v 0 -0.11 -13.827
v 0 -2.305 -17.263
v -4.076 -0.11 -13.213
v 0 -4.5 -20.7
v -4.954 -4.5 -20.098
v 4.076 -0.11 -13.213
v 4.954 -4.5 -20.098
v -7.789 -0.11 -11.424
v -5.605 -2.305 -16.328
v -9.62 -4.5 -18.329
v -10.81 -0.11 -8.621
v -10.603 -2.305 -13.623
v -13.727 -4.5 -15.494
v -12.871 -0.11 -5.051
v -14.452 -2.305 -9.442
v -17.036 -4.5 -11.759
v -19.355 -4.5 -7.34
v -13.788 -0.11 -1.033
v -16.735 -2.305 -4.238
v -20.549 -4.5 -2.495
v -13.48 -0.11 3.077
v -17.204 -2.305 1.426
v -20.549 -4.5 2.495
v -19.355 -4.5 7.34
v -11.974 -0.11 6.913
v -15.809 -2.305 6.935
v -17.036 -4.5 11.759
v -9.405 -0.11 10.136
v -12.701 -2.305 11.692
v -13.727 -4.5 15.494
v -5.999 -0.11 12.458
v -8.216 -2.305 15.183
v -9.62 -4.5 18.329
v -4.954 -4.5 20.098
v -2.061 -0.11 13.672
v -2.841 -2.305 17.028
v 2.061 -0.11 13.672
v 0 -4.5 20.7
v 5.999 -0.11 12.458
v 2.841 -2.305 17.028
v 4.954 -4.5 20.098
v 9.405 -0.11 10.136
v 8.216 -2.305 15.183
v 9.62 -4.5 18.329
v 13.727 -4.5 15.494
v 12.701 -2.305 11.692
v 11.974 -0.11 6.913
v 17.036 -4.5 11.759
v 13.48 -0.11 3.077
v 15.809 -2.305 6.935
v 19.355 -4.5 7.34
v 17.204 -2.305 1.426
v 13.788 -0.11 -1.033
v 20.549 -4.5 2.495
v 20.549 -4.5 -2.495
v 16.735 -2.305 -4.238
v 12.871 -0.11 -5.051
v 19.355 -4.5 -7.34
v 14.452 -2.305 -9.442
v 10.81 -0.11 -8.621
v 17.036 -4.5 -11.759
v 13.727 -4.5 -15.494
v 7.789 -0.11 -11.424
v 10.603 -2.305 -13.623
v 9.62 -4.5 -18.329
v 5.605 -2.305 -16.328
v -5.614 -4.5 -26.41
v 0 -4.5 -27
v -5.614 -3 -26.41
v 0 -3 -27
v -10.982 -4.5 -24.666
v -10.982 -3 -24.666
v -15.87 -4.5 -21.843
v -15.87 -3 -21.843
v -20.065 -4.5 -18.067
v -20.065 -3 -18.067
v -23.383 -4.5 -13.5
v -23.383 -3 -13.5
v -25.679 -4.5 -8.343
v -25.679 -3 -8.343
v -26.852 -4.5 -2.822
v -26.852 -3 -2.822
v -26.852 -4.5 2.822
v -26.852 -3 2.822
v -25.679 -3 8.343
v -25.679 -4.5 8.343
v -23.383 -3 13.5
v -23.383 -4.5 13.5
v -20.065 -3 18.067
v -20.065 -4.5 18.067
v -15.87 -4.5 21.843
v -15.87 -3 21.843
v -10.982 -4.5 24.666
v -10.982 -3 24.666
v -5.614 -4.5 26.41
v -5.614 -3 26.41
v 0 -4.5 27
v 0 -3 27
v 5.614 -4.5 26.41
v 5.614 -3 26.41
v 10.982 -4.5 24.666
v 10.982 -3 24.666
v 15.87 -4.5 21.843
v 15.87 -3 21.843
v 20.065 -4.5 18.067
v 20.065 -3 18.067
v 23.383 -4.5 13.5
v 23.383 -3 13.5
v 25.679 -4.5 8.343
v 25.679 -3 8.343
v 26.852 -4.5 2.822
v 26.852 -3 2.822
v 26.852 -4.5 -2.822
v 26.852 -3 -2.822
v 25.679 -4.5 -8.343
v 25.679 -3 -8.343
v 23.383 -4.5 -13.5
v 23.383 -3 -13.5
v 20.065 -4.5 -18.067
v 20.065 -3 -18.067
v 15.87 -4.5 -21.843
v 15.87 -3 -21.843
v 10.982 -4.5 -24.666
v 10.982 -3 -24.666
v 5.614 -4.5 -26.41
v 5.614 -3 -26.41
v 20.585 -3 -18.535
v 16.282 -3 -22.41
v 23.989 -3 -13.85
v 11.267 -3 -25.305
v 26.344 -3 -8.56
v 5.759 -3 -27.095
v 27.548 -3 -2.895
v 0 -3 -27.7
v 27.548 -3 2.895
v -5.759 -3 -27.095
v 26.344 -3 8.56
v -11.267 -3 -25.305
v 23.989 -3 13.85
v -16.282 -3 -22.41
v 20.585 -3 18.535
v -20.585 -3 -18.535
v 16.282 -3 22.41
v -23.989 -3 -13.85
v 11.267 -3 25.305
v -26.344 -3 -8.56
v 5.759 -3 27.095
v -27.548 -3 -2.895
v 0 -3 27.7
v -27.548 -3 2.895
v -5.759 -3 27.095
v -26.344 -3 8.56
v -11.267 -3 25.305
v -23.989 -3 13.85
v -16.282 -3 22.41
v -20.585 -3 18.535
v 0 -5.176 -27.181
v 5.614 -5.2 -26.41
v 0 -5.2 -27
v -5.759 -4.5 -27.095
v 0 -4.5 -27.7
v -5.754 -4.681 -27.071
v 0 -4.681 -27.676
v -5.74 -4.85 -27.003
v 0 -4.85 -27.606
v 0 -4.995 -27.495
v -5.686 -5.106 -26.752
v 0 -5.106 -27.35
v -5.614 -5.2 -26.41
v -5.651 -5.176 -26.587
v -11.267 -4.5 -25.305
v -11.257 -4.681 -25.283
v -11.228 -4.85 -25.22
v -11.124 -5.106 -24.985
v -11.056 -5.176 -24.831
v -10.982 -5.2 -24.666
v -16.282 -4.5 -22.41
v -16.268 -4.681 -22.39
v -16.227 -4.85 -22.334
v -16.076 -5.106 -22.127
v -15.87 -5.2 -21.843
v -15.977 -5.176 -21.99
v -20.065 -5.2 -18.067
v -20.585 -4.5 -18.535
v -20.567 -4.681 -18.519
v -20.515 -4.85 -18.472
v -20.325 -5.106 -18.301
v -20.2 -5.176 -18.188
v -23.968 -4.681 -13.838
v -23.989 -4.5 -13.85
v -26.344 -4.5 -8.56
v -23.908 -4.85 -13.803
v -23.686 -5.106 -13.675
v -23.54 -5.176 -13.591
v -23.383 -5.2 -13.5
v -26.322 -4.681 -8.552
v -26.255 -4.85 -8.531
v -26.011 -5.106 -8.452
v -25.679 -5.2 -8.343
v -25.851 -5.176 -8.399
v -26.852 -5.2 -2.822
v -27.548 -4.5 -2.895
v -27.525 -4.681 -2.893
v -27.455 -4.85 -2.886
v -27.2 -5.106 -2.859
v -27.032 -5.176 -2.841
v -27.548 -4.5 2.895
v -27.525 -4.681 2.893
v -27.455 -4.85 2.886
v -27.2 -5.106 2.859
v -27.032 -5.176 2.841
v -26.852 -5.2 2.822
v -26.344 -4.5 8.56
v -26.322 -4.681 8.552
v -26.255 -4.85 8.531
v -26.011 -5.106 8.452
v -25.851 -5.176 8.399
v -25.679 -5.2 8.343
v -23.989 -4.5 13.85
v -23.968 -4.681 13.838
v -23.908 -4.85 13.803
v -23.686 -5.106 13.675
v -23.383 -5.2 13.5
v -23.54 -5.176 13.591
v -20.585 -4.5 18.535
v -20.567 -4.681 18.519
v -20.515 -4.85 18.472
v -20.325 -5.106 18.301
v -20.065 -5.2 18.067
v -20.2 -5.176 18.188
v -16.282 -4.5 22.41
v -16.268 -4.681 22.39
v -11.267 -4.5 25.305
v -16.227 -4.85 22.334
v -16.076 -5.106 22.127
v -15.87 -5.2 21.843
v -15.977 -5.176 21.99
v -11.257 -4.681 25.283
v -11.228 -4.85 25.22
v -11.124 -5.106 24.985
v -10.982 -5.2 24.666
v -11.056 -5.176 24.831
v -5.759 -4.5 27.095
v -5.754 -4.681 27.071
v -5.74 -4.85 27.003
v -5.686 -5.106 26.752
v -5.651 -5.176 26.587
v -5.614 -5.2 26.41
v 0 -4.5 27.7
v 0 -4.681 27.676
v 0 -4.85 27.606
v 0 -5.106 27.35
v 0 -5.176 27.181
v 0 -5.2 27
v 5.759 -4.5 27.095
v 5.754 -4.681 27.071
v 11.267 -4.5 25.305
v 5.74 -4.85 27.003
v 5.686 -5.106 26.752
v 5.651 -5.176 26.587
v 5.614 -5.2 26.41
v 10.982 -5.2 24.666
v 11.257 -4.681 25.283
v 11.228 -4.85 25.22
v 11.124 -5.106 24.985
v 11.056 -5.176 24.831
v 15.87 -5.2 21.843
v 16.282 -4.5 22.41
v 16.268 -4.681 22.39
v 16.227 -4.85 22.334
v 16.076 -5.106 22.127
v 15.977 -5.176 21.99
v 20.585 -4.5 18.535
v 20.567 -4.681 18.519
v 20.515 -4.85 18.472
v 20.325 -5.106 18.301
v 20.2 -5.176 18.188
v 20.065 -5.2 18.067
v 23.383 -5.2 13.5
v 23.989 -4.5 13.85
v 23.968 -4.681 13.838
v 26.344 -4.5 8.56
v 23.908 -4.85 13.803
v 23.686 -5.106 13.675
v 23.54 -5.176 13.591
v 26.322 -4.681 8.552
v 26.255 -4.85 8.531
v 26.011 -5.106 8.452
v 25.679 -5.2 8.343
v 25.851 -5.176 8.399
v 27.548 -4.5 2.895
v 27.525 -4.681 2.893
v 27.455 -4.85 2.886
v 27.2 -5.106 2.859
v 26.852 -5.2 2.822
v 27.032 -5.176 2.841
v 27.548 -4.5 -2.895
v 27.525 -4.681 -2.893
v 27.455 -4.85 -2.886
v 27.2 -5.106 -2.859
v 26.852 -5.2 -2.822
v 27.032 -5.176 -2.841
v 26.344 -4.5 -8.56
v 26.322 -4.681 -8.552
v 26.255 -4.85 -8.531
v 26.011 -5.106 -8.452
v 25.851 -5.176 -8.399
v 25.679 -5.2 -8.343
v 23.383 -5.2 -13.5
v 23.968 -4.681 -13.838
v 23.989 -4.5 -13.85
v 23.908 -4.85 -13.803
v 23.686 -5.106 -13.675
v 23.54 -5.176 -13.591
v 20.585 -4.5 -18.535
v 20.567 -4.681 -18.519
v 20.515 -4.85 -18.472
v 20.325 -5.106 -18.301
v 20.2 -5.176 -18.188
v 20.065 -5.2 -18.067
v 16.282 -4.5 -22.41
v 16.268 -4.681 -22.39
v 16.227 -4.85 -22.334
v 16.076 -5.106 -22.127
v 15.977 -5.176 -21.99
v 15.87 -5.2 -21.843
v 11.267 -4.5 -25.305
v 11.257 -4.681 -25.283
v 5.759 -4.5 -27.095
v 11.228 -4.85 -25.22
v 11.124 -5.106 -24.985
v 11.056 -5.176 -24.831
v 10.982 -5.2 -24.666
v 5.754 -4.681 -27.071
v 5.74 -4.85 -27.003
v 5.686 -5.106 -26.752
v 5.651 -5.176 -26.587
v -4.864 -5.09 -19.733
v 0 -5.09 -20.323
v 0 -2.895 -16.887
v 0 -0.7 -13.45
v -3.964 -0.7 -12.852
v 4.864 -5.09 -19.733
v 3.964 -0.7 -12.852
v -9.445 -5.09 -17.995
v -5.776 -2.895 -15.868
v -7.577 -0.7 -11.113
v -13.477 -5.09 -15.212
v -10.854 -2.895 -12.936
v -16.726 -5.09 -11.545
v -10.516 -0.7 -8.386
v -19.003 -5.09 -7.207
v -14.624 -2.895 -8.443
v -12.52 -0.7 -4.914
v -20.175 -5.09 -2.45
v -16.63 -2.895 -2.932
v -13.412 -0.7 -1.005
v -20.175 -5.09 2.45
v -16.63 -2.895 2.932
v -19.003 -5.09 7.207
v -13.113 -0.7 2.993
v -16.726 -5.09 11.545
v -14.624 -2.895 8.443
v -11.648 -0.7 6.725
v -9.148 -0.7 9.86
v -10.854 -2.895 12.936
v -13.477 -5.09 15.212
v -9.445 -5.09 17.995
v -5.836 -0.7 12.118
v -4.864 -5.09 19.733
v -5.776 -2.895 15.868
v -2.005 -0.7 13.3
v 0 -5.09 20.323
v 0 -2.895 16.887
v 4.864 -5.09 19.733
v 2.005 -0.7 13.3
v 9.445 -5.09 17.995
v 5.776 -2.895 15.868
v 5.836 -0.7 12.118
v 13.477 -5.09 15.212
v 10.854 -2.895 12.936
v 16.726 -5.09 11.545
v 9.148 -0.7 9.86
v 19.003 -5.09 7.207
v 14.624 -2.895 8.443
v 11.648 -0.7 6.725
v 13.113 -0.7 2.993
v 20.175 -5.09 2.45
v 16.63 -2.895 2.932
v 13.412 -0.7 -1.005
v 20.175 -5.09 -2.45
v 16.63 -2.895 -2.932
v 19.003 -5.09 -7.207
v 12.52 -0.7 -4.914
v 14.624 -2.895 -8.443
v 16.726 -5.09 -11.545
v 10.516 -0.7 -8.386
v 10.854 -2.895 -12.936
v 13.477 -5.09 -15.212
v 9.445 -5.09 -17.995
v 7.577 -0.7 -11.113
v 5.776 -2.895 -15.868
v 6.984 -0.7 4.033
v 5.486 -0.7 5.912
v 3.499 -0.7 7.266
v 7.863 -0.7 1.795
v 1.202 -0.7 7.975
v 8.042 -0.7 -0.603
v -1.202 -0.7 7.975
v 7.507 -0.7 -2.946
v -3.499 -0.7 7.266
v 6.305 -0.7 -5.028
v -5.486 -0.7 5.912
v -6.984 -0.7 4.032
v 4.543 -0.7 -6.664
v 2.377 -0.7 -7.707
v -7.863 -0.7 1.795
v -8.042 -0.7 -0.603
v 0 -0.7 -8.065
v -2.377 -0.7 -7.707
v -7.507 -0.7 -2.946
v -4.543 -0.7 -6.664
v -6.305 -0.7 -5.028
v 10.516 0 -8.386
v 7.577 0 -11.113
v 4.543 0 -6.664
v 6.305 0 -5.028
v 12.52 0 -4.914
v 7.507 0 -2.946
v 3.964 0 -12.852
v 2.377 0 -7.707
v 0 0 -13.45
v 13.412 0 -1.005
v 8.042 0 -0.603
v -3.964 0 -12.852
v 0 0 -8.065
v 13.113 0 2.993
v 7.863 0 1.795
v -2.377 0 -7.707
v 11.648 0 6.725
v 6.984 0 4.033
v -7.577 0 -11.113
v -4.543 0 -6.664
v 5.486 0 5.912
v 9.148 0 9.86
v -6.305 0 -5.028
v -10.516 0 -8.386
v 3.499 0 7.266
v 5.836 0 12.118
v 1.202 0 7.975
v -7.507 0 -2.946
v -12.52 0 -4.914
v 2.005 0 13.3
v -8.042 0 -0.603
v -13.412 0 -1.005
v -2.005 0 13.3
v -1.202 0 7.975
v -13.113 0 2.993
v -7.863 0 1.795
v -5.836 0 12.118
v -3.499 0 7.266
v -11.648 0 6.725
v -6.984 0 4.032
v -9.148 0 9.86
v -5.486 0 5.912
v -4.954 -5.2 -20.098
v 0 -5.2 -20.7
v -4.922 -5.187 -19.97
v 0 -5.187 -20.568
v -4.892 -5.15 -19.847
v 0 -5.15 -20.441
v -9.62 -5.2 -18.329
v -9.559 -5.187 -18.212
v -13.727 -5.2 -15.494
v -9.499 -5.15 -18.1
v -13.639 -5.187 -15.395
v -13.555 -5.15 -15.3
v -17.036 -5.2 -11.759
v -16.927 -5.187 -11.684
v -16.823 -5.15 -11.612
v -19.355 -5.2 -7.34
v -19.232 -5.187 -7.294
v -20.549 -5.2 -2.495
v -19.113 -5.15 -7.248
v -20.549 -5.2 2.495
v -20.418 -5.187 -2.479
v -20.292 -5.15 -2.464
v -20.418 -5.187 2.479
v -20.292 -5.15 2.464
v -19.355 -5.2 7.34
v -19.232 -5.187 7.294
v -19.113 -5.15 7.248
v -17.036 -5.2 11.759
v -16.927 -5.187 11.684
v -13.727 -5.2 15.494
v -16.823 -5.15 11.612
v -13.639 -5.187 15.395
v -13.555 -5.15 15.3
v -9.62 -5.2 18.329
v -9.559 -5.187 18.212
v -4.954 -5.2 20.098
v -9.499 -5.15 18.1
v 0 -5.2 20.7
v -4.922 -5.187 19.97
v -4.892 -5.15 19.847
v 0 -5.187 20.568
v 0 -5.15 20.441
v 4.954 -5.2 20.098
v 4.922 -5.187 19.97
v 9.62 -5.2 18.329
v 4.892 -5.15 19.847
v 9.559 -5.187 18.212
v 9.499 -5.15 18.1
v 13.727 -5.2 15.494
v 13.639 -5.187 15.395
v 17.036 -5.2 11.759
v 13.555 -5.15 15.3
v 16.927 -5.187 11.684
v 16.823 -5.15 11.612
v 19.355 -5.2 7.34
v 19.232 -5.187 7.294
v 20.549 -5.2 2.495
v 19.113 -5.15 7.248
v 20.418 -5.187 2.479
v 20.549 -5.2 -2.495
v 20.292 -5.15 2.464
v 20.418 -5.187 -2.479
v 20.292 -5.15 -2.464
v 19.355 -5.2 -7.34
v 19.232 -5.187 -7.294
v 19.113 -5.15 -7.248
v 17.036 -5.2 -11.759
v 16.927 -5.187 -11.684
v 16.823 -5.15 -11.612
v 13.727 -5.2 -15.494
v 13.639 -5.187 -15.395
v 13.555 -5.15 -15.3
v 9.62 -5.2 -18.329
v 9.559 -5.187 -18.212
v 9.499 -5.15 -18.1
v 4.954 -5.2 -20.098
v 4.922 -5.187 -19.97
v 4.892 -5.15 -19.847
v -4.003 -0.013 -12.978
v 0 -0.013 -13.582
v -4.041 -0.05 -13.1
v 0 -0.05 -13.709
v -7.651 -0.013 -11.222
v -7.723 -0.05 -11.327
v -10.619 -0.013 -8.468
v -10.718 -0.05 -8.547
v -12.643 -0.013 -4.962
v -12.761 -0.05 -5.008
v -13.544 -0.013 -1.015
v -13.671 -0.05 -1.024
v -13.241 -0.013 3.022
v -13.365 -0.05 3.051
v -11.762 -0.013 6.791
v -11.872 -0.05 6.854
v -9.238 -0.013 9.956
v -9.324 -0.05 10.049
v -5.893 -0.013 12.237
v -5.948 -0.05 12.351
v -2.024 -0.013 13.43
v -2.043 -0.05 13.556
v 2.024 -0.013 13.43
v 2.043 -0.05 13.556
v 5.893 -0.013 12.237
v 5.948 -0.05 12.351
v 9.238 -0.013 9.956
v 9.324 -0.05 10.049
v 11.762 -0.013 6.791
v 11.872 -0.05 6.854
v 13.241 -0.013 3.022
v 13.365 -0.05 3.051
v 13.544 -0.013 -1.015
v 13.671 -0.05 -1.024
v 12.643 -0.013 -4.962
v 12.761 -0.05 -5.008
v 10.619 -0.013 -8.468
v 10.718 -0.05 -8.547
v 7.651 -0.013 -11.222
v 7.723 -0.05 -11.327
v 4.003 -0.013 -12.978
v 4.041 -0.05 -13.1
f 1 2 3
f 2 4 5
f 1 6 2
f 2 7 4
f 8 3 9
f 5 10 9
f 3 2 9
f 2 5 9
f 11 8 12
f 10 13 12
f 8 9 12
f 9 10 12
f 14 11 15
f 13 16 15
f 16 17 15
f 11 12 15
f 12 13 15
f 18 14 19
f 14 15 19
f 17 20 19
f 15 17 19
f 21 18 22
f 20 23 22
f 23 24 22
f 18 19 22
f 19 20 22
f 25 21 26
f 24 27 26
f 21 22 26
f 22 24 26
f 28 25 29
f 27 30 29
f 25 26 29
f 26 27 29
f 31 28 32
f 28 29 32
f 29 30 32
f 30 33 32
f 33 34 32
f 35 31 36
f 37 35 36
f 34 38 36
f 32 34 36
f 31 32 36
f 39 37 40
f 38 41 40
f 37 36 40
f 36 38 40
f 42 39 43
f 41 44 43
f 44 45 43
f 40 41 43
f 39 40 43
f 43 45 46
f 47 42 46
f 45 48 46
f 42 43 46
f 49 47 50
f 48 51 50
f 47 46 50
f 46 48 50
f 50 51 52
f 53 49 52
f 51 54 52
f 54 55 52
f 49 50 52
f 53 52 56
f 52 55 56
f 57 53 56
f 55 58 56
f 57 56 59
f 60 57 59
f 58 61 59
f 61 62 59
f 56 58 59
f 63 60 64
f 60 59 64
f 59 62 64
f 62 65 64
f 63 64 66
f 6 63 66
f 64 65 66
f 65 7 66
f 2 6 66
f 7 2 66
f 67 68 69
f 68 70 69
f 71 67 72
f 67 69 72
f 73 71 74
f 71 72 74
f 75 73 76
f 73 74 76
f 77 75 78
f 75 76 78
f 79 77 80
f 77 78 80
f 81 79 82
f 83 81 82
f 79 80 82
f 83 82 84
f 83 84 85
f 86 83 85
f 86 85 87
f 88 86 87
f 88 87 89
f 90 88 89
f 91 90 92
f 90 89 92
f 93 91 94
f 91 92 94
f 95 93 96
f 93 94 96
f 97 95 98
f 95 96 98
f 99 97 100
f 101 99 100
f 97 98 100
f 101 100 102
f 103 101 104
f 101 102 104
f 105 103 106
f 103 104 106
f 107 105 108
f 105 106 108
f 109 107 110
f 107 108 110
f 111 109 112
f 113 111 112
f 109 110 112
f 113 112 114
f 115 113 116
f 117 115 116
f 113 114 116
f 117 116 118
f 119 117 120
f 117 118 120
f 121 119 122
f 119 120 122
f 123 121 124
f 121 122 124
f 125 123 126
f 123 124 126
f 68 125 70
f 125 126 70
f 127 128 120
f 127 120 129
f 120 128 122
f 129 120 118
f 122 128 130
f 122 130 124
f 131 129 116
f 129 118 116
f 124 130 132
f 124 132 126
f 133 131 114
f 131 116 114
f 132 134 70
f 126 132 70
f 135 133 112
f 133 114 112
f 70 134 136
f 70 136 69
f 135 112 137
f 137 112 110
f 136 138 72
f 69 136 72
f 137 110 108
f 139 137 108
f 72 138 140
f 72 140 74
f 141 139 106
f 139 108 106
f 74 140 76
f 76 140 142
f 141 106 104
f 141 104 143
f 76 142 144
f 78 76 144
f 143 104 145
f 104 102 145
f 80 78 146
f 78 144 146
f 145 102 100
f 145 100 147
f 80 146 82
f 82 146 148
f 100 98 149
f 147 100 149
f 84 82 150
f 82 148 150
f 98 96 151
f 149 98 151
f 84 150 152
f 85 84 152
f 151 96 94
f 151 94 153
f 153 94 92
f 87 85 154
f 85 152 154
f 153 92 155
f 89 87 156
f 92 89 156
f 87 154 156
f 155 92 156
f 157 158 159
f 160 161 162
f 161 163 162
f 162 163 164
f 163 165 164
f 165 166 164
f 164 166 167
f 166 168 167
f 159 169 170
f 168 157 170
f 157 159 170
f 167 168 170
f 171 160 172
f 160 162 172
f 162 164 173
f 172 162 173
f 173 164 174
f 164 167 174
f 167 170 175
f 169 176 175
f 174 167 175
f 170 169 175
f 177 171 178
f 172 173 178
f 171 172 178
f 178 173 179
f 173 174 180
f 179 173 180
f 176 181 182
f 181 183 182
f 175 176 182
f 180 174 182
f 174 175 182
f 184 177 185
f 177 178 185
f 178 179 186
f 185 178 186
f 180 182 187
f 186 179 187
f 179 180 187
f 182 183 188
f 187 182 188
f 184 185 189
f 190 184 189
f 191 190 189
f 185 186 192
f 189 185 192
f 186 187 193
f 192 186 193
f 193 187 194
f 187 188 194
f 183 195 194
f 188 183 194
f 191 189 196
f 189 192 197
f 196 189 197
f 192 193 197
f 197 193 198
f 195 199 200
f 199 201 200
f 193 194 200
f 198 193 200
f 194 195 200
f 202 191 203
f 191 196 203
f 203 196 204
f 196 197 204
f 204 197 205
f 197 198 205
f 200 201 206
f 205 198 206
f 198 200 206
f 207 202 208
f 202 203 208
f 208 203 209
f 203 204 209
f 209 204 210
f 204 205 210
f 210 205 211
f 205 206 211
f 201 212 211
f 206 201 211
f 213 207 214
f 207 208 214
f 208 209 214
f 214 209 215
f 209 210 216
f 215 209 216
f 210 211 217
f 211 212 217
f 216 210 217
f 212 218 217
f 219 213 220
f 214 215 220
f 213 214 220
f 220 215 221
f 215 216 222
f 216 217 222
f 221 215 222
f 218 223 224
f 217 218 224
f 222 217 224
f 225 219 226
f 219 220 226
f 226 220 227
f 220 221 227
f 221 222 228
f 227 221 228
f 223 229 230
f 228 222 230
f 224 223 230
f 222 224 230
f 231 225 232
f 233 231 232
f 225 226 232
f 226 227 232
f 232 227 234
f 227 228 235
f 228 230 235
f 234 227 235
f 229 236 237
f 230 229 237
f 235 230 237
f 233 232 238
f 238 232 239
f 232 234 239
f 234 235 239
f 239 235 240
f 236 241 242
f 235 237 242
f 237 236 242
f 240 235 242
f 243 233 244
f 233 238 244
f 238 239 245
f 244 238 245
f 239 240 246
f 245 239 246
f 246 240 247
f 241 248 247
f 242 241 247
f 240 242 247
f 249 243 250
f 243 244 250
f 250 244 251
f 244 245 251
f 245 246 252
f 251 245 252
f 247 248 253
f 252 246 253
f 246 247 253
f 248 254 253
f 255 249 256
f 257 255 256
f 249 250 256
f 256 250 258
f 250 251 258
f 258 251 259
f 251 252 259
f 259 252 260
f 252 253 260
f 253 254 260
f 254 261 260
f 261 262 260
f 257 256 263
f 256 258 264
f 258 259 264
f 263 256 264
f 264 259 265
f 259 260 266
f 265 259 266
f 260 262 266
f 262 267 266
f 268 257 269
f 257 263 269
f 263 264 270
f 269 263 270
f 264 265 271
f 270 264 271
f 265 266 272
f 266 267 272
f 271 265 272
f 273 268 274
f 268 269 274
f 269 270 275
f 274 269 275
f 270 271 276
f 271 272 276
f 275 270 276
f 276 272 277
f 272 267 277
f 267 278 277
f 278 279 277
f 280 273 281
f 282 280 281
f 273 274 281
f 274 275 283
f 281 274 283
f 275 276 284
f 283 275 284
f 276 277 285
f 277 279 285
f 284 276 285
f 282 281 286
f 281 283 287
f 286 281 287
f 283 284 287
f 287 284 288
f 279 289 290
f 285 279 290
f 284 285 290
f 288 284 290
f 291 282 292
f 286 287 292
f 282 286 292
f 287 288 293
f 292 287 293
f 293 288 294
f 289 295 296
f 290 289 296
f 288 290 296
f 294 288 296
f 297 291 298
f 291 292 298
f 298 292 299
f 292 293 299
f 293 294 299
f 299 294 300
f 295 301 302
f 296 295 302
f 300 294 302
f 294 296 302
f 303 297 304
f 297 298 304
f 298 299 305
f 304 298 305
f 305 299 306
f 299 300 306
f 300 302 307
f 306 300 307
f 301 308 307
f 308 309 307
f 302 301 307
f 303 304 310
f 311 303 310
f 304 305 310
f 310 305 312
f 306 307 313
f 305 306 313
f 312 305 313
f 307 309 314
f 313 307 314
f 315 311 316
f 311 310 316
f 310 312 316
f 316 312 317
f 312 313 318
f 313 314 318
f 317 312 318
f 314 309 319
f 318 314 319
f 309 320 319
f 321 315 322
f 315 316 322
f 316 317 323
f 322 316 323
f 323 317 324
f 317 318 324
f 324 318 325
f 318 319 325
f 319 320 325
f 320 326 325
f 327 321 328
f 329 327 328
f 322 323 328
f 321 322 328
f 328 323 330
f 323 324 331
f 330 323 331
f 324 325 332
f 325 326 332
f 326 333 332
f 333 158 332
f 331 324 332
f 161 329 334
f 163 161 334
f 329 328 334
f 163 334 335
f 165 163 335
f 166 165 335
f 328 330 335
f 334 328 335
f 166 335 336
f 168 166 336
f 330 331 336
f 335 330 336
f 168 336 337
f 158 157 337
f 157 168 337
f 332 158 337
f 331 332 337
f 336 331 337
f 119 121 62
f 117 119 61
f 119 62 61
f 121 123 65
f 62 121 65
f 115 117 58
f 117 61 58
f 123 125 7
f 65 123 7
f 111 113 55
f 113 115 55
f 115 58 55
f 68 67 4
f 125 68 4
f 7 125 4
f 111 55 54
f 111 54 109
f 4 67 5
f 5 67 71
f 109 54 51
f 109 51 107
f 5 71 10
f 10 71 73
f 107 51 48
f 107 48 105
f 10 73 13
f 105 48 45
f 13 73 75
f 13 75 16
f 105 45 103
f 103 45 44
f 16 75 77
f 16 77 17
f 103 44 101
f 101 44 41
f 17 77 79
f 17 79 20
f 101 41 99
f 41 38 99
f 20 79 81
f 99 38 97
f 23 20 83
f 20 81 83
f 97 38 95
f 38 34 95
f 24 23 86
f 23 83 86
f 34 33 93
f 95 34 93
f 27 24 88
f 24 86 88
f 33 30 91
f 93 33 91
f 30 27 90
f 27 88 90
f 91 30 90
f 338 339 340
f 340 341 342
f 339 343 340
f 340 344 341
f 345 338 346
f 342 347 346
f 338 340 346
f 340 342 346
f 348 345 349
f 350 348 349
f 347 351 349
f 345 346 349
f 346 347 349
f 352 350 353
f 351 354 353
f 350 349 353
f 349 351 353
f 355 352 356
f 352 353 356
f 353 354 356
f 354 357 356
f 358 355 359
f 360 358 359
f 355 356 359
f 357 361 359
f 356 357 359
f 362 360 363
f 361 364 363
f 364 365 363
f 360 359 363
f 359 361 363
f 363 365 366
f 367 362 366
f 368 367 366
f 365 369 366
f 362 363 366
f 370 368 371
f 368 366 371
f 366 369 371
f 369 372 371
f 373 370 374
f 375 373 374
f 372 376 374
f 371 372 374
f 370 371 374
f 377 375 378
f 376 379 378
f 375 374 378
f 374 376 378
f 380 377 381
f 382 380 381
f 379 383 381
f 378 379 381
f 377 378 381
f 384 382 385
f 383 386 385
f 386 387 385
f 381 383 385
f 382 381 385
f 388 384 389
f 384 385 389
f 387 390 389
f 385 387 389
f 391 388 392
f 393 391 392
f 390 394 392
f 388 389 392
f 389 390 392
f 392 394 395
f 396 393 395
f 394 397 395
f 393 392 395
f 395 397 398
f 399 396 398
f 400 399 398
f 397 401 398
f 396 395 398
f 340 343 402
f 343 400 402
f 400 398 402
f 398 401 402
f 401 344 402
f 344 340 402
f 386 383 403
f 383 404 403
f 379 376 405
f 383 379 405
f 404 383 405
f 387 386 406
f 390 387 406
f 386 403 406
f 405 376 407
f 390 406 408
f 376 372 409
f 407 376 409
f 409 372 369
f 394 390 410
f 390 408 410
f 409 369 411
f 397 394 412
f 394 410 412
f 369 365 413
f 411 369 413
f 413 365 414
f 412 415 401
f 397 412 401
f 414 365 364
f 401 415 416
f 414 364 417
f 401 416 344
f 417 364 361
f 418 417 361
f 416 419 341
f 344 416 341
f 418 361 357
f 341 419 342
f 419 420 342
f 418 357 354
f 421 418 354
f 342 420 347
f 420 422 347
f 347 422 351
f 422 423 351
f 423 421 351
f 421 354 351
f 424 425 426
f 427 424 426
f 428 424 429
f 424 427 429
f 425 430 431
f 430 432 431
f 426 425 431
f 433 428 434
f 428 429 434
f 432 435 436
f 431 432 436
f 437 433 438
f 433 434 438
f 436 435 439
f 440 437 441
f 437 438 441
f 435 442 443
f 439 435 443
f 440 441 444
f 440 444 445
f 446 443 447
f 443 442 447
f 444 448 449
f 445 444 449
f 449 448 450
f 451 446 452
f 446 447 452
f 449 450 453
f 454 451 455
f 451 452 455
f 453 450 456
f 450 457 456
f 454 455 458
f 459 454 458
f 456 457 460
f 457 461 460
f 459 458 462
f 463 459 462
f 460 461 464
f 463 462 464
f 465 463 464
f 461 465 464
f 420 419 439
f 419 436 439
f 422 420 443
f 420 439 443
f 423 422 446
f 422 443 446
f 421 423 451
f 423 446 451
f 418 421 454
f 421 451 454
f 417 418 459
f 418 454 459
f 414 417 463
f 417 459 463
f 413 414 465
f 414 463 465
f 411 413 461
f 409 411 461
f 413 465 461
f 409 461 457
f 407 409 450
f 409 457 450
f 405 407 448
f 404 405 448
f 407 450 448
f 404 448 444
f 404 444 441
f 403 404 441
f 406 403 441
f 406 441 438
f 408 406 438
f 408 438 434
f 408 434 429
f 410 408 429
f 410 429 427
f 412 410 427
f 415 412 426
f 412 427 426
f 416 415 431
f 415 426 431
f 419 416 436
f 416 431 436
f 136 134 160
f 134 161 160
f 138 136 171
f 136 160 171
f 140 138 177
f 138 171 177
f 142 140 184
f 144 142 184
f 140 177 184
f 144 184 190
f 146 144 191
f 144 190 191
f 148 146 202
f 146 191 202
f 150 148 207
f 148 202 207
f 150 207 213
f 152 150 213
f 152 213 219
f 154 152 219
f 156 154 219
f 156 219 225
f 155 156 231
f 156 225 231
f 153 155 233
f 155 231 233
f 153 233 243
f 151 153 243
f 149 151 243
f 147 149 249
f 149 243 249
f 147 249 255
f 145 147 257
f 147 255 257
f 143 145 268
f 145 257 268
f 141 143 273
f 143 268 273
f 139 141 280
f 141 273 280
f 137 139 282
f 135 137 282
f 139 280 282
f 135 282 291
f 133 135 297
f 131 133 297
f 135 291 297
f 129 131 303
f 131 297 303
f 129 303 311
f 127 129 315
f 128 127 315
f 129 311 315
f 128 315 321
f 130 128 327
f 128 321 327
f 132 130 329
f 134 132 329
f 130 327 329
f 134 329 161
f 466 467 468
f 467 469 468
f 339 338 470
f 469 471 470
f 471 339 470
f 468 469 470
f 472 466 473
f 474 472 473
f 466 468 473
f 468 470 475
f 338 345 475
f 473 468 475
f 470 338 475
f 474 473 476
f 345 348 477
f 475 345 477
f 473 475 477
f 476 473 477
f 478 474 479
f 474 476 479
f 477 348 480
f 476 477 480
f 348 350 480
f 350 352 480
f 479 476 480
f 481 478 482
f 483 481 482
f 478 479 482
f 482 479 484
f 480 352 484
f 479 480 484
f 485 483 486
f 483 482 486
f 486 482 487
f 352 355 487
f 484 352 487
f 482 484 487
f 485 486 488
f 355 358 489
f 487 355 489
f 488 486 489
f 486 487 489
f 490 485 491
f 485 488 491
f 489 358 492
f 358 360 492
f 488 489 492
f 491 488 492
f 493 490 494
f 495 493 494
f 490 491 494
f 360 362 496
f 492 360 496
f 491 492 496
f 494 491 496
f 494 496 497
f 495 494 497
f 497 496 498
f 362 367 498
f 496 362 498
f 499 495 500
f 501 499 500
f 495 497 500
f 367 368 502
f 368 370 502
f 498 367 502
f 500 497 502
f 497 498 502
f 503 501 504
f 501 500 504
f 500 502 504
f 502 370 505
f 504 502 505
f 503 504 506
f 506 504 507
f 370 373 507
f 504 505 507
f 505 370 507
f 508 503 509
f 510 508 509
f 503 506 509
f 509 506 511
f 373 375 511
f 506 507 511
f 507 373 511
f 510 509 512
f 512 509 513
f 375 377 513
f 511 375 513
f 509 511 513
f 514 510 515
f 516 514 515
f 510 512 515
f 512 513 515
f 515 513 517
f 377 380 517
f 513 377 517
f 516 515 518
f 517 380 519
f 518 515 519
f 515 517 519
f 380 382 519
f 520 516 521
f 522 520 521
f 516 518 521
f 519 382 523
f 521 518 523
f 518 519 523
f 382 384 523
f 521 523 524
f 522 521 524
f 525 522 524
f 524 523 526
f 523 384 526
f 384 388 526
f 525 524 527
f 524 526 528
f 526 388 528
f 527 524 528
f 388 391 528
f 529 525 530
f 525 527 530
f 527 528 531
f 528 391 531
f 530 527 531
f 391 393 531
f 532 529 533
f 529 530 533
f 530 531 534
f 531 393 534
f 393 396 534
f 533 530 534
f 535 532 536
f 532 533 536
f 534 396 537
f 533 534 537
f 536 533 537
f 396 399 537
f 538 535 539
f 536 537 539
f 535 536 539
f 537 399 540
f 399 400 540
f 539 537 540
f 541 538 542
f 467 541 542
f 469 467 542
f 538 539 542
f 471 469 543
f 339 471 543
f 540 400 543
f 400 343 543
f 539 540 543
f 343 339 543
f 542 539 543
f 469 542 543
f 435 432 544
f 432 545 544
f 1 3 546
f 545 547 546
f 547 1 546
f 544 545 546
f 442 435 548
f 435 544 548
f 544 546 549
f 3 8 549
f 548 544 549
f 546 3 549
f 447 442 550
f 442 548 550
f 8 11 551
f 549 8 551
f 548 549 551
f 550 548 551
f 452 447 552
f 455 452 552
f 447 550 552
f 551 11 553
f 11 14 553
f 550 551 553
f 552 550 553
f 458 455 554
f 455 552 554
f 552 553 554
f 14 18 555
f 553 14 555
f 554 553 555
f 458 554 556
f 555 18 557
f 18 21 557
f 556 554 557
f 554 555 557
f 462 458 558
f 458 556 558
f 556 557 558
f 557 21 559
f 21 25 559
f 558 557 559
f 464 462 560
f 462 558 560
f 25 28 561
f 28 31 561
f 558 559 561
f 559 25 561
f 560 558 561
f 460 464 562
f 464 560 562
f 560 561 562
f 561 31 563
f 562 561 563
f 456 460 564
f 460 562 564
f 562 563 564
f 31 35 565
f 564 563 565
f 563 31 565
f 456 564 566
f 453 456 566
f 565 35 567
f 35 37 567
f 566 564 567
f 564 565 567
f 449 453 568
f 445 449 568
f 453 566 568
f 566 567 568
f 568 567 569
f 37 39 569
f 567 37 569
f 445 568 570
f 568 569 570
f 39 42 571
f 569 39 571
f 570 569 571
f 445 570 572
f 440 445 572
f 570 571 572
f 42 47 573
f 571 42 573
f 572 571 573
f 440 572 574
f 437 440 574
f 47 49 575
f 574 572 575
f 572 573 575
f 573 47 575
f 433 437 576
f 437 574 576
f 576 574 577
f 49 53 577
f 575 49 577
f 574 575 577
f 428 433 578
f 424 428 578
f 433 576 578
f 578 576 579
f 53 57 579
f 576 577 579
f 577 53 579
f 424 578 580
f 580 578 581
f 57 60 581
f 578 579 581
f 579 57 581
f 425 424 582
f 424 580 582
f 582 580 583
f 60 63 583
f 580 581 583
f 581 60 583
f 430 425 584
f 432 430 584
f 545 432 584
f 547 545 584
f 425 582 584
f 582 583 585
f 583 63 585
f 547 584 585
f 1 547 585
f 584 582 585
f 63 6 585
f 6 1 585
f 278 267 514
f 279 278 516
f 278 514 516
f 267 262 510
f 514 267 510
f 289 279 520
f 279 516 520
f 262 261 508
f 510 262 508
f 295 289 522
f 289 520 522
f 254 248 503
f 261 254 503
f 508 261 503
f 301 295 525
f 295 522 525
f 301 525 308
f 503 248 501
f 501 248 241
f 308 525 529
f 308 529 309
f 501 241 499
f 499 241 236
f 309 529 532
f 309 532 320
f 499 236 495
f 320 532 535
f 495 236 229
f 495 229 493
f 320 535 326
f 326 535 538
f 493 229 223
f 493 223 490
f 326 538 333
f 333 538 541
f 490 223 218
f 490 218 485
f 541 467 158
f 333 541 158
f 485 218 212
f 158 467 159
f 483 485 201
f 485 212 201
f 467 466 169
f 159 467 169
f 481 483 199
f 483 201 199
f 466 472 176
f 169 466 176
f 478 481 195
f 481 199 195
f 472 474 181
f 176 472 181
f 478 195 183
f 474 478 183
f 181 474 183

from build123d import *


with BuildPart() as part:
    # Croquis1 → Revolución1 (revolve)
    with BuildSketch(Plane.XY, mode=Mode.PRIVATE) as revoluci_n1_sk:
        with BuildLine():
            Line((-8.065, 0), (-13.45, 0))
            ThreePointArc((-13.45, 0), (-13.646270241, -0.028078879), (-13.826794629, -0.110062878))
            Line((-13.826794629, -0.110062878), (-20.7, -4.5))
            Line((-20.7, -4.5), (-27, -4.5))
            Line((-27, -4.5), (-27, -3))
            Line((-27, -3), (-27.7, -3))
            Line((-27.7, -3), (-27.7, -4.5))
            ThreePointArc((-27.7, -4.5), (-27.494974747, -4.994974747), (-27, -5.2))
            Line((-27, -5.2), (-20.7, -5.2))
            ThreePointArc((-20.7, -5.2), (-20.503729759, -5.171921121), (-20.323205371, -5.089937122))
            Line((-20.323205371, -5.089937122), (-13.45, -0.7))
            Line((-13.45, -0.7), (-8.065, -0.7))
            Line((-8.065, -0.7), (-8.065, 0))
        make_face()
    revolve(revoluci_n1_sk.sketch.rotate(Axis((0, 0, 0), (0, 1, 0)), 270), axis=Axis((0, 0, 0), (0, 1, 0)))


solid = part.part
